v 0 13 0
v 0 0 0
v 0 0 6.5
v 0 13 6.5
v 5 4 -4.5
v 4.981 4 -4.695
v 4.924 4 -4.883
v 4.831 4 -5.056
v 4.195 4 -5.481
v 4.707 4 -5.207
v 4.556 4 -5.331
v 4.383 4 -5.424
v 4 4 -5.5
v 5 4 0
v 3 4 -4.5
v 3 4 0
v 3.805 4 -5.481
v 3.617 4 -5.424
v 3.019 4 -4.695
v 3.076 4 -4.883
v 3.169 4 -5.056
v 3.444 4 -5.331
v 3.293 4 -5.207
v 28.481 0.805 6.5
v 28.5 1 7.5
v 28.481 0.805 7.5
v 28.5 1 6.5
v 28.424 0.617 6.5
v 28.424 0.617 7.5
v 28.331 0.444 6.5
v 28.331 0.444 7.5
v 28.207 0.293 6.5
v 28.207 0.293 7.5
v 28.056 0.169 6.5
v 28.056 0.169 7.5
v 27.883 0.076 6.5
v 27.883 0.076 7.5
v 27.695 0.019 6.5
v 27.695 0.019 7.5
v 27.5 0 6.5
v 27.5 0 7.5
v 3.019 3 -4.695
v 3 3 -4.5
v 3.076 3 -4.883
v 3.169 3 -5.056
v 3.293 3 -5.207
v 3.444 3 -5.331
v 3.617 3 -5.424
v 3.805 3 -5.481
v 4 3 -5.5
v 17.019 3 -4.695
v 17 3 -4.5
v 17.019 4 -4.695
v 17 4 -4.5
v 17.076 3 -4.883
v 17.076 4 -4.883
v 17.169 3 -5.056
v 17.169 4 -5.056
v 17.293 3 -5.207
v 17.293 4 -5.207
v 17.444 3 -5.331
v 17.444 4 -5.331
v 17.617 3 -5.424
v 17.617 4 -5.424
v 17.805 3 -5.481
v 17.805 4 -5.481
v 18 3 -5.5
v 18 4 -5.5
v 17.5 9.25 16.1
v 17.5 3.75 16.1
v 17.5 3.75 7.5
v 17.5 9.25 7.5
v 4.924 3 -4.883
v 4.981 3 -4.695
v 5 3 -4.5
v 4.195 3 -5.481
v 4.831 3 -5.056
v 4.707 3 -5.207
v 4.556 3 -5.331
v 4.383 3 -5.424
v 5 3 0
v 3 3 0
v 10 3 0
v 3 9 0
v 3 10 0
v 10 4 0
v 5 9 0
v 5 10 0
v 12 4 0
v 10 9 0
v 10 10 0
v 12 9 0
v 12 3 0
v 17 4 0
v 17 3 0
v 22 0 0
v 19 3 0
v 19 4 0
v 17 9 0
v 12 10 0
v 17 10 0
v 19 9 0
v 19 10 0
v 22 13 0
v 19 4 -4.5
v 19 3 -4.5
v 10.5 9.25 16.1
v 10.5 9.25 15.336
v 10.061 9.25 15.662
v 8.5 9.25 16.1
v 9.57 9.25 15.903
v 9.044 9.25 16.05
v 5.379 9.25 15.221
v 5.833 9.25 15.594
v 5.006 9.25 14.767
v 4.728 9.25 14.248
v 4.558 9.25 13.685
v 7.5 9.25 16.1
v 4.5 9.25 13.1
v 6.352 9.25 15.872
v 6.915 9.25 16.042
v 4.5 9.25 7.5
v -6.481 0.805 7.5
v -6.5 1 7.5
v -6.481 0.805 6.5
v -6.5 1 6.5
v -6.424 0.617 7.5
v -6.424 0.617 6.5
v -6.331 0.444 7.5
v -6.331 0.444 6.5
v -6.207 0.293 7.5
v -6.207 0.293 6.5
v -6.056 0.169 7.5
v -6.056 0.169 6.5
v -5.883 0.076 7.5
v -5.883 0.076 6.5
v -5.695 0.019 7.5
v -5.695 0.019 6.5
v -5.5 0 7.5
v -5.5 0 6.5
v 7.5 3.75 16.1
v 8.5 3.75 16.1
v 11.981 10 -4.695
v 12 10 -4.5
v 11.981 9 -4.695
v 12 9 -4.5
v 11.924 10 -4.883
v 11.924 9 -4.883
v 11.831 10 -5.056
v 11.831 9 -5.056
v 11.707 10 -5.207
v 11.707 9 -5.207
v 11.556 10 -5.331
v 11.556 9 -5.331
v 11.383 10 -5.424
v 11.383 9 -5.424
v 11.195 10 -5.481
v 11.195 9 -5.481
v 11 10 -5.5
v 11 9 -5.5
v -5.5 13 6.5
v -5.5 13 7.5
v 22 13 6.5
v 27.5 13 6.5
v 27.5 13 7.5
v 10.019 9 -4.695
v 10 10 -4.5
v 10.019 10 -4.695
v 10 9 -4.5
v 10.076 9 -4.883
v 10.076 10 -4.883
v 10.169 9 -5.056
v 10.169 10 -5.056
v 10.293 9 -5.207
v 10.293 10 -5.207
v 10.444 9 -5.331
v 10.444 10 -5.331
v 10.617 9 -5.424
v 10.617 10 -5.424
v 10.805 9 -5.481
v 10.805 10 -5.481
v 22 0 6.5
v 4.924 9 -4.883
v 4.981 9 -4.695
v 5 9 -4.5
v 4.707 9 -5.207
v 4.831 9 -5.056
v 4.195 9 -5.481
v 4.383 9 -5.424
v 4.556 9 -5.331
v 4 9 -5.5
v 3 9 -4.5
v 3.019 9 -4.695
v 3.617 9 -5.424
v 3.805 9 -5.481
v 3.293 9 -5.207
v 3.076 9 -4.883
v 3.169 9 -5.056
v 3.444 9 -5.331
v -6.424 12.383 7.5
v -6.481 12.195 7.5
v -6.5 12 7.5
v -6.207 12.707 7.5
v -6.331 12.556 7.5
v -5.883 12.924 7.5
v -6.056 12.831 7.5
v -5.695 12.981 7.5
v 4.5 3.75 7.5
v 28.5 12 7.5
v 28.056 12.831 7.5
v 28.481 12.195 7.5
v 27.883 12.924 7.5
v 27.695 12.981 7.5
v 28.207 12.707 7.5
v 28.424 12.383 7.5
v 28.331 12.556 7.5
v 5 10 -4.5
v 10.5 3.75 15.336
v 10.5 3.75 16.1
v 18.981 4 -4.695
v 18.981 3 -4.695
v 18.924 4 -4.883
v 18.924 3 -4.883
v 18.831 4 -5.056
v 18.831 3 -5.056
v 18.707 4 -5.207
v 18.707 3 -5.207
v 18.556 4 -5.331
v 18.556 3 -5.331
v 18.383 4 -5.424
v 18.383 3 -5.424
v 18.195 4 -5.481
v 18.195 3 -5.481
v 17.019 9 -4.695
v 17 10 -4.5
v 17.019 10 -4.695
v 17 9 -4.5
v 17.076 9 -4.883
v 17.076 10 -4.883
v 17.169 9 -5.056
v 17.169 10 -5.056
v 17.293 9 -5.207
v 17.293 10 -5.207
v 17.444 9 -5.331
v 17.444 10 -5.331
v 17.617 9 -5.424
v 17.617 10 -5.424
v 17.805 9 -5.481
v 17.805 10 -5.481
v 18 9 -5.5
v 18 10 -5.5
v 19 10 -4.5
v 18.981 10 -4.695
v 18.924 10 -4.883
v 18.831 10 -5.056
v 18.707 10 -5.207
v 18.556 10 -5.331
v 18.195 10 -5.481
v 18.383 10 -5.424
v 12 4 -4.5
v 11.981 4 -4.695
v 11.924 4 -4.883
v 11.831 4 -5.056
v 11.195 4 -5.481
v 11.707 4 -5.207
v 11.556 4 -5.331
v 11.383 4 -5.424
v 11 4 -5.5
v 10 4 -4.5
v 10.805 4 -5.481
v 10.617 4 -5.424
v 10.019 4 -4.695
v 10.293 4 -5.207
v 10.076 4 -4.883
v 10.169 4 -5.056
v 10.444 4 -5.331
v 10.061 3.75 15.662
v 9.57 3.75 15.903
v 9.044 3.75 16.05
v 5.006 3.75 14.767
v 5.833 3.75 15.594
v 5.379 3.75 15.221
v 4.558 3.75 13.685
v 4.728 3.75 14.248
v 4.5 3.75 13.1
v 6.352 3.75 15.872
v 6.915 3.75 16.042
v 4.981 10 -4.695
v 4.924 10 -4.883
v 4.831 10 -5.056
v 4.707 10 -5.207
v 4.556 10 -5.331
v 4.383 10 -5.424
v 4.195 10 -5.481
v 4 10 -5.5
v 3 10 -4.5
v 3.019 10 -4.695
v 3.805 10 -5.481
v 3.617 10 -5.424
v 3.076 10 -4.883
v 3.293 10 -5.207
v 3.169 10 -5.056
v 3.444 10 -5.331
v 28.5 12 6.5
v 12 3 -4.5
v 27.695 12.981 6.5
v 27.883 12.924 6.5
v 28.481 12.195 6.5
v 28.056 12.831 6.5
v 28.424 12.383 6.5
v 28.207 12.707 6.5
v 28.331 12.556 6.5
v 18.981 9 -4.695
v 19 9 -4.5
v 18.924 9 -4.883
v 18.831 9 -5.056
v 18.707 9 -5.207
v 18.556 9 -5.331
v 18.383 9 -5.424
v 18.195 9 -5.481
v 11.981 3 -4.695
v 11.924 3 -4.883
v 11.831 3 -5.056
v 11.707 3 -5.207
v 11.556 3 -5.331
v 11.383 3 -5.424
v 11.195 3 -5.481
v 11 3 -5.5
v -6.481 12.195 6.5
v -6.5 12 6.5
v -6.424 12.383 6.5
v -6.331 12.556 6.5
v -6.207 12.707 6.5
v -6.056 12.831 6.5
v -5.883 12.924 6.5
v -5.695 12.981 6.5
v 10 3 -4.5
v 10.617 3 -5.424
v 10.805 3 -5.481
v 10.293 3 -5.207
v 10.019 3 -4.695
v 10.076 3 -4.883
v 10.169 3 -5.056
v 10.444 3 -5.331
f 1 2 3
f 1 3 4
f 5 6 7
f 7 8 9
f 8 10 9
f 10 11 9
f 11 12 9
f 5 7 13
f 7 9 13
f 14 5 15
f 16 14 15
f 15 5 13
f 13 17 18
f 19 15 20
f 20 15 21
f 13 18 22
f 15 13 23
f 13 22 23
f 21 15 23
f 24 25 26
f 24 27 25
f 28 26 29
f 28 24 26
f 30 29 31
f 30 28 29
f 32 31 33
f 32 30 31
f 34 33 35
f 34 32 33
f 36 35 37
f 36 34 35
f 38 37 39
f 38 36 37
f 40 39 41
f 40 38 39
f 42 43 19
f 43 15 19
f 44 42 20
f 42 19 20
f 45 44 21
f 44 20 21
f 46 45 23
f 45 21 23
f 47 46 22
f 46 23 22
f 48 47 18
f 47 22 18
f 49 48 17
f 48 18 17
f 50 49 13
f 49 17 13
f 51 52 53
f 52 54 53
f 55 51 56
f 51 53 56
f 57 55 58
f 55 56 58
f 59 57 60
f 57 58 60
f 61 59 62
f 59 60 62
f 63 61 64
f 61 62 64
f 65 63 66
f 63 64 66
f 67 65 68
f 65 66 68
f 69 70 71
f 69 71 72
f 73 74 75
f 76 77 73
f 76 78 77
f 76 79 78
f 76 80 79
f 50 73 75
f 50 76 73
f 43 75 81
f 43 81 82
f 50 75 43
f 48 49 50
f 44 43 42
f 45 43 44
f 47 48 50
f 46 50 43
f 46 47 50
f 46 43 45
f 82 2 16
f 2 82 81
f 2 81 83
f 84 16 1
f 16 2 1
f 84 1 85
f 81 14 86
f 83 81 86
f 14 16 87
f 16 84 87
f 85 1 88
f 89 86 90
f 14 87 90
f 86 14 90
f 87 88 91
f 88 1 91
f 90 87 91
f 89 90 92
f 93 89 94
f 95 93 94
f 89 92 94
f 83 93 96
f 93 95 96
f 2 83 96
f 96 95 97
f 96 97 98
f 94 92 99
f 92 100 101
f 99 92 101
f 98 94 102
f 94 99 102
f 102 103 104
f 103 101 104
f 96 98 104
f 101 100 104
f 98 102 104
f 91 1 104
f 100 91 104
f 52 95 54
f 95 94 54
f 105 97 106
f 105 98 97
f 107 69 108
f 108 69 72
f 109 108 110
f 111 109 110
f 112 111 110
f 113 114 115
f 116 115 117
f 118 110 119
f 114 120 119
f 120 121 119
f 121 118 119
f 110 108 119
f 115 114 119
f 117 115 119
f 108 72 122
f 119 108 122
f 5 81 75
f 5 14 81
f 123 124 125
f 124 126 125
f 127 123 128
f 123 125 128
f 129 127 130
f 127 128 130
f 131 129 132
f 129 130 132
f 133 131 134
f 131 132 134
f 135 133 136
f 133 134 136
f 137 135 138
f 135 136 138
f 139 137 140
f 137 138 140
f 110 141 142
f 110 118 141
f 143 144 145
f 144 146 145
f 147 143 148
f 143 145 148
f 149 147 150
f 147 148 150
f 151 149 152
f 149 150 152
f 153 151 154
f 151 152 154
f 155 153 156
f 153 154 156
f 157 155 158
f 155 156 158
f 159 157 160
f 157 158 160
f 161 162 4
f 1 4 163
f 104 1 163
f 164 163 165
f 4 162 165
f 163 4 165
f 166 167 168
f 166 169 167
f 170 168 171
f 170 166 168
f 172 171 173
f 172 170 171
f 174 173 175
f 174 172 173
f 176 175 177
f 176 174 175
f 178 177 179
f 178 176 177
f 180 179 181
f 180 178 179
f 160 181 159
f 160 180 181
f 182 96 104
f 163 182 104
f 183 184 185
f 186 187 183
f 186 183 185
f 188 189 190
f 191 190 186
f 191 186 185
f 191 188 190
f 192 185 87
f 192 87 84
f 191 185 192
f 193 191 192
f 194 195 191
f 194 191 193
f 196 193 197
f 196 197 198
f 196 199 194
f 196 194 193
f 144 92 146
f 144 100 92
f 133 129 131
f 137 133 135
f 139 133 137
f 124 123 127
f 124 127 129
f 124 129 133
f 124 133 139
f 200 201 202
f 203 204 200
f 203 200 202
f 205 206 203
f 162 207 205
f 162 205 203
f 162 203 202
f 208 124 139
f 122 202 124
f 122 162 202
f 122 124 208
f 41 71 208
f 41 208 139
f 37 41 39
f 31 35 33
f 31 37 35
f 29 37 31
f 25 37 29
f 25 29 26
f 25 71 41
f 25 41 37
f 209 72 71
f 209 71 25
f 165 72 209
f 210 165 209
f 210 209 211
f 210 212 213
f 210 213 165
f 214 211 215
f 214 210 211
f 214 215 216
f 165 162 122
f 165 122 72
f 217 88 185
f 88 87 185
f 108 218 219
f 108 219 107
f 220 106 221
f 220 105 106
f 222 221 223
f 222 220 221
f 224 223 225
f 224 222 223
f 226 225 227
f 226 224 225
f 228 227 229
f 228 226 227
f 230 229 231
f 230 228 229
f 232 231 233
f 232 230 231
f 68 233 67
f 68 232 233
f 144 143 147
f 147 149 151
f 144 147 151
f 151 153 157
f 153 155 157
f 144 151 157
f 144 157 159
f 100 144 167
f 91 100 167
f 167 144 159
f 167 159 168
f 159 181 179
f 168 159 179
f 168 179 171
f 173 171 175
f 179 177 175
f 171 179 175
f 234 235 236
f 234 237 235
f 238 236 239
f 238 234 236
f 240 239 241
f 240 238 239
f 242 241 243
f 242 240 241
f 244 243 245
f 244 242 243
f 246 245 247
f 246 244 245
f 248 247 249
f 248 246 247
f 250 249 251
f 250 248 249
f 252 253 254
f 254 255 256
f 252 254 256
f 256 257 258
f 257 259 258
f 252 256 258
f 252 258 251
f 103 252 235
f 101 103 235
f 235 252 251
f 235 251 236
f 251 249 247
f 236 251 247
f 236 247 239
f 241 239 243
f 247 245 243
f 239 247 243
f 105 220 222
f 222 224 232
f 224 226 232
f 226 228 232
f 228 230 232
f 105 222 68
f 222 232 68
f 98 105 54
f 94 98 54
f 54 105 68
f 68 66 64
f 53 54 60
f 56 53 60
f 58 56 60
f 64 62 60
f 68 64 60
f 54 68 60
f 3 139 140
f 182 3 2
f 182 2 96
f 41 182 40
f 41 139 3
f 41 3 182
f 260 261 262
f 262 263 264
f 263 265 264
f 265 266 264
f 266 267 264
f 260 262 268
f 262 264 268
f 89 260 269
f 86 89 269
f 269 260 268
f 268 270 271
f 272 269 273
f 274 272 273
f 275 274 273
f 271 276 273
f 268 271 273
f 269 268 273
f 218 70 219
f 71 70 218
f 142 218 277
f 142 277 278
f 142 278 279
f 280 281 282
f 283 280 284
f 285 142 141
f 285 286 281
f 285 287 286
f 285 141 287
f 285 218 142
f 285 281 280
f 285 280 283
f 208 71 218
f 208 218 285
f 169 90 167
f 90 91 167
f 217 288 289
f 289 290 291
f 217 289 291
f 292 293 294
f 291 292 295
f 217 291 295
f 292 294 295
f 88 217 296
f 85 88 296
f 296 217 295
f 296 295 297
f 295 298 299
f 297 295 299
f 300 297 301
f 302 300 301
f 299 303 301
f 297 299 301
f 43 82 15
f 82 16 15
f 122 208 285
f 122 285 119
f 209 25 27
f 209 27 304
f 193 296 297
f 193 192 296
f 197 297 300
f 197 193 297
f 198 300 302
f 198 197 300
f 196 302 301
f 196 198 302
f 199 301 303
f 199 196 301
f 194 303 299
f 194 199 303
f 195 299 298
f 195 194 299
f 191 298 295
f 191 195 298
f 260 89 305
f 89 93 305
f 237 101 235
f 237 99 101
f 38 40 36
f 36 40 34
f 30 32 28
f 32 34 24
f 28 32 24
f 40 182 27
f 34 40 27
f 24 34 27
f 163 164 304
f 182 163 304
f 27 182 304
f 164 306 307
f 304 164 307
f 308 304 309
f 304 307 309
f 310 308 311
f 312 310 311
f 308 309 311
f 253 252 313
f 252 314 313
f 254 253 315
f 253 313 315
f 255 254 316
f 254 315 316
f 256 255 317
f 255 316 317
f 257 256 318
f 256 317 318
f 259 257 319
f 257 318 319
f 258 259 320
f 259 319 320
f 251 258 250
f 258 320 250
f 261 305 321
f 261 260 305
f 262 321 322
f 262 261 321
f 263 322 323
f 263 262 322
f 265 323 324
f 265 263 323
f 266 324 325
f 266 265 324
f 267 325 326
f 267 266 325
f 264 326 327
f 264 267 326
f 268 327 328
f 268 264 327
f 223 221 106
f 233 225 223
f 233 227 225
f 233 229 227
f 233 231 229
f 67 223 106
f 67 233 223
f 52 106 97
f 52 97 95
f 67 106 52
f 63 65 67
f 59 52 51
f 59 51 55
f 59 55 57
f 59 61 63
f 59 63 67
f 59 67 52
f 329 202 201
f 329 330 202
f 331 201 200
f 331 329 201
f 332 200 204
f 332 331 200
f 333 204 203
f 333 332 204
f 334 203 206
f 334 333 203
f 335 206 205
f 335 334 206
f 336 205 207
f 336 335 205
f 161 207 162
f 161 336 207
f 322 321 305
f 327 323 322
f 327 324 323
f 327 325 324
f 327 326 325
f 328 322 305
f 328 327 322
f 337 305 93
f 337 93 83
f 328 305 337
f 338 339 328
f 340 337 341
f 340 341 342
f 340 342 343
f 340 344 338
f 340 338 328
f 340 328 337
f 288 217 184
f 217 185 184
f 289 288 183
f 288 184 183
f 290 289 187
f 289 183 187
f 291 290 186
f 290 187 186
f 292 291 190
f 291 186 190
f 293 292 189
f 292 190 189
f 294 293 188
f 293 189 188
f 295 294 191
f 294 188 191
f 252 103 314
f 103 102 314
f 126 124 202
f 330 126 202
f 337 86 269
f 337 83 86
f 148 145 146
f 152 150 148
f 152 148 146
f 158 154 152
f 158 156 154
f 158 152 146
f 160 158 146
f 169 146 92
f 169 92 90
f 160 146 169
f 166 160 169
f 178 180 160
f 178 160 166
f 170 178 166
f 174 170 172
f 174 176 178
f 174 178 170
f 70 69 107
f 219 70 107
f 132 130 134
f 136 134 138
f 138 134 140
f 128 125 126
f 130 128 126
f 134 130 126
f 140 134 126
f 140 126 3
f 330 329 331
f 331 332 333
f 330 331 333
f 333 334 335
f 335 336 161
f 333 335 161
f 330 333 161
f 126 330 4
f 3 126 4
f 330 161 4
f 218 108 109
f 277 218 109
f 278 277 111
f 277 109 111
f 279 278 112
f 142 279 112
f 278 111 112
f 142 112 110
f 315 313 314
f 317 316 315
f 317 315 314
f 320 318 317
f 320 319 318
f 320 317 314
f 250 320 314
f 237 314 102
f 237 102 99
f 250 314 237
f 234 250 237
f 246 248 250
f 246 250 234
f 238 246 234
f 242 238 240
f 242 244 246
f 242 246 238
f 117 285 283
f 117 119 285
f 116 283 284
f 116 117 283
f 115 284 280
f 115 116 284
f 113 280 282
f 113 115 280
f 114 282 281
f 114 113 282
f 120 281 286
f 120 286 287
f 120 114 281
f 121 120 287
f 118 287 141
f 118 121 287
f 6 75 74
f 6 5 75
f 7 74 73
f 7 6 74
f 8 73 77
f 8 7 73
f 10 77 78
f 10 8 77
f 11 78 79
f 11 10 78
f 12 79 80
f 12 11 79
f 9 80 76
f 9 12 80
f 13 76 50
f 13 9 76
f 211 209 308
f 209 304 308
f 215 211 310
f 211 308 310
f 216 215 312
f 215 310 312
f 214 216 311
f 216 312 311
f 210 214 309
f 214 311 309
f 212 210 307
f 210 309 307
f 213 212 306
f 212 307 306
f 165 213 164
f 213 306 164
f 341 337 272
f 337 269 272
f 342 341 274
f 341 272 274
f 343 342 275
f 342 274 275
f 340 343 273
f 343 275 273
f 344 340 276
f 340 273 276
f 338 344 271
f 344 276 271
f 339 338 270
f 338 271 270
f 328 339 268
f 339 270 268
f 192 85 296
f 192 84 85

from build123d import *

# Parameters (mm, degrees)
SKETCH_1_W             = 22
SKETCH_1_H             = 13
EXTRUDE_1_DEPTH        = 7.5
SKETCH_2_W             = 6.5
SKETCH_2_H             = 13
EXTRUDE_2_DEPTH        = 1
FILLET_1_R             = 1
SKETCH_3_W             = 2
SKETCH_3_H             = 5.5
EXTRUDE_3_DEPTH        = 0.5
FILLET_2_R             = 1
FILLET_2_OF_MIRROR_1_R = 1
SKETCH_4_W             = 7
SKETCH_4_H             = 5.5
EXTRUDE_4_DEPTH        = 8.6
FILLET_3_R             = 3


with BuildPart() as part:
    # Эскиз1 → Бобышка-Вытянуть1 (new body)
    with BuildSketch(Plane.XY):
        with Locations((11, 6.5)):
            Rectangle(SKETCH_1_W, SKETCH_1_H)
    extrude(amount=EXTRUDE_1_DEPTH)

    # Эскиз2 → Бобышка-Вытянуть2 (add)
    with BuildSketch(Plane.XY.offset(7.5)):
        with Locations((-3.25, 6.5)):
            Rectangle(SKETCH_2_W, SKETCH_2_H)
        with Locations((25.25, 6.5)):
            Rectangle(SKETCH_2_W, SKETCH_2_H)
    extrude(amount=-EXTRUDE_2_DEPTH)

    # Скругление1
    fillet_1_edges = [part.edges().sort_by_distance(p)[0] for p in [
        (28.5, 13, 7),
        (28.5, 0, 7),
        (-6.5, 13, 7),
        (-6.5, 0, 7),
    ]]
    fillet(fillet_1_edges, radius=FILLET_1_R)

    # Эскиз3 → Бобышка-Вытянуть3 (add, symmetric)
    with BuildSketch(Plane(origin=(0, 3.5, 0), x_dir=(-1, 0, 0), z_dir=(0, -1, 0))):
        with Locations((-4, 2.75)):
            Rectangle(SKETCH_3_W, SKETCH_3_H)
        with Locations((-18, 2.75)):
            Rectangle(SKETCH_3_W, SKETCH_3_H)
        with Locations((-11, 2.75)):
            Rectangle(SKETCH_3_W, SKETCH_3_H)
    extrude_3 = extrude(amount=EXTRUDE_3_DEPTH, both=True)

    # Скругление2
    fillet_2_edges = [part.edges().sort_by_distance(p)[0] for p in [
        (19, 3.5, -5.5),
        (17, 3.5, -5.5),
        (12, 3.5, -5.5),
        (10, 3.5, -5.5),
        (5, 3.5, -5.5),
        (3, 3.5, -5.5),
    ]]
    fillet(fillet_2_edges, radius=FILLET_2_R - 0.0001)  # a hair under: the kernel refuses the full size

    # Зеркальное отражение1: Бобышка-Вытянуть3 across plane
    add(extrude_3.mirror(Plane(origin=(0, 6.5, 0), x_dir=(0, 0, 1), z_dir=(0, -1, 0))))

    # Скругление2 of Зеркальное отражение1
    fillet_2_of_mirror_1_edges = [part.edges().sort_by_distance(p)[0] for p in [
        (19, 9.5, -5.5),
        (17, 9.5, -5.5),
        (12, 9.5, -5.5),
        (10, 9.5, -5.5),
        (5, 9.5, -5.5),
        (3, 9.5, -5.5),
    ]]
    fillet(fillet_2_of_mirror_1_edges, radius=FILLET_2_OF_MIRROR_1_R - 0.0001)  # a hair under: the kernel refuses the full size

    # Эскиз4 → Бобышка-Вытянуть4 (add)
    with BuildSketch(Plane.XY.offset(7.5)):
        with Locations((8, 6.5)):
            Rectangle(SKETCH_4_W, SKETCH_4_H)
    extrude_4 = extrude(amount=EXTRUDE_4_DEPTH)

    # Скругление3
    fillet_3_edges = [part.edges().sort_by_distance(p)[0] for p in [
        (11.5, 6.5, 16.1),
        (4.5, 6.5, 16.1),
    ]]
    fillet(fillet_3_edges, radius=FILLET_3_R)

    # Зеркальное отражение4: Бобышка-Вытянуть4 across plane
    add(extrude_4.mirror(Plane(origin=(11, 0, 0), x_dir=(0, 0, 1), z_dir=(1, 0, 0))))


solid = part.part
